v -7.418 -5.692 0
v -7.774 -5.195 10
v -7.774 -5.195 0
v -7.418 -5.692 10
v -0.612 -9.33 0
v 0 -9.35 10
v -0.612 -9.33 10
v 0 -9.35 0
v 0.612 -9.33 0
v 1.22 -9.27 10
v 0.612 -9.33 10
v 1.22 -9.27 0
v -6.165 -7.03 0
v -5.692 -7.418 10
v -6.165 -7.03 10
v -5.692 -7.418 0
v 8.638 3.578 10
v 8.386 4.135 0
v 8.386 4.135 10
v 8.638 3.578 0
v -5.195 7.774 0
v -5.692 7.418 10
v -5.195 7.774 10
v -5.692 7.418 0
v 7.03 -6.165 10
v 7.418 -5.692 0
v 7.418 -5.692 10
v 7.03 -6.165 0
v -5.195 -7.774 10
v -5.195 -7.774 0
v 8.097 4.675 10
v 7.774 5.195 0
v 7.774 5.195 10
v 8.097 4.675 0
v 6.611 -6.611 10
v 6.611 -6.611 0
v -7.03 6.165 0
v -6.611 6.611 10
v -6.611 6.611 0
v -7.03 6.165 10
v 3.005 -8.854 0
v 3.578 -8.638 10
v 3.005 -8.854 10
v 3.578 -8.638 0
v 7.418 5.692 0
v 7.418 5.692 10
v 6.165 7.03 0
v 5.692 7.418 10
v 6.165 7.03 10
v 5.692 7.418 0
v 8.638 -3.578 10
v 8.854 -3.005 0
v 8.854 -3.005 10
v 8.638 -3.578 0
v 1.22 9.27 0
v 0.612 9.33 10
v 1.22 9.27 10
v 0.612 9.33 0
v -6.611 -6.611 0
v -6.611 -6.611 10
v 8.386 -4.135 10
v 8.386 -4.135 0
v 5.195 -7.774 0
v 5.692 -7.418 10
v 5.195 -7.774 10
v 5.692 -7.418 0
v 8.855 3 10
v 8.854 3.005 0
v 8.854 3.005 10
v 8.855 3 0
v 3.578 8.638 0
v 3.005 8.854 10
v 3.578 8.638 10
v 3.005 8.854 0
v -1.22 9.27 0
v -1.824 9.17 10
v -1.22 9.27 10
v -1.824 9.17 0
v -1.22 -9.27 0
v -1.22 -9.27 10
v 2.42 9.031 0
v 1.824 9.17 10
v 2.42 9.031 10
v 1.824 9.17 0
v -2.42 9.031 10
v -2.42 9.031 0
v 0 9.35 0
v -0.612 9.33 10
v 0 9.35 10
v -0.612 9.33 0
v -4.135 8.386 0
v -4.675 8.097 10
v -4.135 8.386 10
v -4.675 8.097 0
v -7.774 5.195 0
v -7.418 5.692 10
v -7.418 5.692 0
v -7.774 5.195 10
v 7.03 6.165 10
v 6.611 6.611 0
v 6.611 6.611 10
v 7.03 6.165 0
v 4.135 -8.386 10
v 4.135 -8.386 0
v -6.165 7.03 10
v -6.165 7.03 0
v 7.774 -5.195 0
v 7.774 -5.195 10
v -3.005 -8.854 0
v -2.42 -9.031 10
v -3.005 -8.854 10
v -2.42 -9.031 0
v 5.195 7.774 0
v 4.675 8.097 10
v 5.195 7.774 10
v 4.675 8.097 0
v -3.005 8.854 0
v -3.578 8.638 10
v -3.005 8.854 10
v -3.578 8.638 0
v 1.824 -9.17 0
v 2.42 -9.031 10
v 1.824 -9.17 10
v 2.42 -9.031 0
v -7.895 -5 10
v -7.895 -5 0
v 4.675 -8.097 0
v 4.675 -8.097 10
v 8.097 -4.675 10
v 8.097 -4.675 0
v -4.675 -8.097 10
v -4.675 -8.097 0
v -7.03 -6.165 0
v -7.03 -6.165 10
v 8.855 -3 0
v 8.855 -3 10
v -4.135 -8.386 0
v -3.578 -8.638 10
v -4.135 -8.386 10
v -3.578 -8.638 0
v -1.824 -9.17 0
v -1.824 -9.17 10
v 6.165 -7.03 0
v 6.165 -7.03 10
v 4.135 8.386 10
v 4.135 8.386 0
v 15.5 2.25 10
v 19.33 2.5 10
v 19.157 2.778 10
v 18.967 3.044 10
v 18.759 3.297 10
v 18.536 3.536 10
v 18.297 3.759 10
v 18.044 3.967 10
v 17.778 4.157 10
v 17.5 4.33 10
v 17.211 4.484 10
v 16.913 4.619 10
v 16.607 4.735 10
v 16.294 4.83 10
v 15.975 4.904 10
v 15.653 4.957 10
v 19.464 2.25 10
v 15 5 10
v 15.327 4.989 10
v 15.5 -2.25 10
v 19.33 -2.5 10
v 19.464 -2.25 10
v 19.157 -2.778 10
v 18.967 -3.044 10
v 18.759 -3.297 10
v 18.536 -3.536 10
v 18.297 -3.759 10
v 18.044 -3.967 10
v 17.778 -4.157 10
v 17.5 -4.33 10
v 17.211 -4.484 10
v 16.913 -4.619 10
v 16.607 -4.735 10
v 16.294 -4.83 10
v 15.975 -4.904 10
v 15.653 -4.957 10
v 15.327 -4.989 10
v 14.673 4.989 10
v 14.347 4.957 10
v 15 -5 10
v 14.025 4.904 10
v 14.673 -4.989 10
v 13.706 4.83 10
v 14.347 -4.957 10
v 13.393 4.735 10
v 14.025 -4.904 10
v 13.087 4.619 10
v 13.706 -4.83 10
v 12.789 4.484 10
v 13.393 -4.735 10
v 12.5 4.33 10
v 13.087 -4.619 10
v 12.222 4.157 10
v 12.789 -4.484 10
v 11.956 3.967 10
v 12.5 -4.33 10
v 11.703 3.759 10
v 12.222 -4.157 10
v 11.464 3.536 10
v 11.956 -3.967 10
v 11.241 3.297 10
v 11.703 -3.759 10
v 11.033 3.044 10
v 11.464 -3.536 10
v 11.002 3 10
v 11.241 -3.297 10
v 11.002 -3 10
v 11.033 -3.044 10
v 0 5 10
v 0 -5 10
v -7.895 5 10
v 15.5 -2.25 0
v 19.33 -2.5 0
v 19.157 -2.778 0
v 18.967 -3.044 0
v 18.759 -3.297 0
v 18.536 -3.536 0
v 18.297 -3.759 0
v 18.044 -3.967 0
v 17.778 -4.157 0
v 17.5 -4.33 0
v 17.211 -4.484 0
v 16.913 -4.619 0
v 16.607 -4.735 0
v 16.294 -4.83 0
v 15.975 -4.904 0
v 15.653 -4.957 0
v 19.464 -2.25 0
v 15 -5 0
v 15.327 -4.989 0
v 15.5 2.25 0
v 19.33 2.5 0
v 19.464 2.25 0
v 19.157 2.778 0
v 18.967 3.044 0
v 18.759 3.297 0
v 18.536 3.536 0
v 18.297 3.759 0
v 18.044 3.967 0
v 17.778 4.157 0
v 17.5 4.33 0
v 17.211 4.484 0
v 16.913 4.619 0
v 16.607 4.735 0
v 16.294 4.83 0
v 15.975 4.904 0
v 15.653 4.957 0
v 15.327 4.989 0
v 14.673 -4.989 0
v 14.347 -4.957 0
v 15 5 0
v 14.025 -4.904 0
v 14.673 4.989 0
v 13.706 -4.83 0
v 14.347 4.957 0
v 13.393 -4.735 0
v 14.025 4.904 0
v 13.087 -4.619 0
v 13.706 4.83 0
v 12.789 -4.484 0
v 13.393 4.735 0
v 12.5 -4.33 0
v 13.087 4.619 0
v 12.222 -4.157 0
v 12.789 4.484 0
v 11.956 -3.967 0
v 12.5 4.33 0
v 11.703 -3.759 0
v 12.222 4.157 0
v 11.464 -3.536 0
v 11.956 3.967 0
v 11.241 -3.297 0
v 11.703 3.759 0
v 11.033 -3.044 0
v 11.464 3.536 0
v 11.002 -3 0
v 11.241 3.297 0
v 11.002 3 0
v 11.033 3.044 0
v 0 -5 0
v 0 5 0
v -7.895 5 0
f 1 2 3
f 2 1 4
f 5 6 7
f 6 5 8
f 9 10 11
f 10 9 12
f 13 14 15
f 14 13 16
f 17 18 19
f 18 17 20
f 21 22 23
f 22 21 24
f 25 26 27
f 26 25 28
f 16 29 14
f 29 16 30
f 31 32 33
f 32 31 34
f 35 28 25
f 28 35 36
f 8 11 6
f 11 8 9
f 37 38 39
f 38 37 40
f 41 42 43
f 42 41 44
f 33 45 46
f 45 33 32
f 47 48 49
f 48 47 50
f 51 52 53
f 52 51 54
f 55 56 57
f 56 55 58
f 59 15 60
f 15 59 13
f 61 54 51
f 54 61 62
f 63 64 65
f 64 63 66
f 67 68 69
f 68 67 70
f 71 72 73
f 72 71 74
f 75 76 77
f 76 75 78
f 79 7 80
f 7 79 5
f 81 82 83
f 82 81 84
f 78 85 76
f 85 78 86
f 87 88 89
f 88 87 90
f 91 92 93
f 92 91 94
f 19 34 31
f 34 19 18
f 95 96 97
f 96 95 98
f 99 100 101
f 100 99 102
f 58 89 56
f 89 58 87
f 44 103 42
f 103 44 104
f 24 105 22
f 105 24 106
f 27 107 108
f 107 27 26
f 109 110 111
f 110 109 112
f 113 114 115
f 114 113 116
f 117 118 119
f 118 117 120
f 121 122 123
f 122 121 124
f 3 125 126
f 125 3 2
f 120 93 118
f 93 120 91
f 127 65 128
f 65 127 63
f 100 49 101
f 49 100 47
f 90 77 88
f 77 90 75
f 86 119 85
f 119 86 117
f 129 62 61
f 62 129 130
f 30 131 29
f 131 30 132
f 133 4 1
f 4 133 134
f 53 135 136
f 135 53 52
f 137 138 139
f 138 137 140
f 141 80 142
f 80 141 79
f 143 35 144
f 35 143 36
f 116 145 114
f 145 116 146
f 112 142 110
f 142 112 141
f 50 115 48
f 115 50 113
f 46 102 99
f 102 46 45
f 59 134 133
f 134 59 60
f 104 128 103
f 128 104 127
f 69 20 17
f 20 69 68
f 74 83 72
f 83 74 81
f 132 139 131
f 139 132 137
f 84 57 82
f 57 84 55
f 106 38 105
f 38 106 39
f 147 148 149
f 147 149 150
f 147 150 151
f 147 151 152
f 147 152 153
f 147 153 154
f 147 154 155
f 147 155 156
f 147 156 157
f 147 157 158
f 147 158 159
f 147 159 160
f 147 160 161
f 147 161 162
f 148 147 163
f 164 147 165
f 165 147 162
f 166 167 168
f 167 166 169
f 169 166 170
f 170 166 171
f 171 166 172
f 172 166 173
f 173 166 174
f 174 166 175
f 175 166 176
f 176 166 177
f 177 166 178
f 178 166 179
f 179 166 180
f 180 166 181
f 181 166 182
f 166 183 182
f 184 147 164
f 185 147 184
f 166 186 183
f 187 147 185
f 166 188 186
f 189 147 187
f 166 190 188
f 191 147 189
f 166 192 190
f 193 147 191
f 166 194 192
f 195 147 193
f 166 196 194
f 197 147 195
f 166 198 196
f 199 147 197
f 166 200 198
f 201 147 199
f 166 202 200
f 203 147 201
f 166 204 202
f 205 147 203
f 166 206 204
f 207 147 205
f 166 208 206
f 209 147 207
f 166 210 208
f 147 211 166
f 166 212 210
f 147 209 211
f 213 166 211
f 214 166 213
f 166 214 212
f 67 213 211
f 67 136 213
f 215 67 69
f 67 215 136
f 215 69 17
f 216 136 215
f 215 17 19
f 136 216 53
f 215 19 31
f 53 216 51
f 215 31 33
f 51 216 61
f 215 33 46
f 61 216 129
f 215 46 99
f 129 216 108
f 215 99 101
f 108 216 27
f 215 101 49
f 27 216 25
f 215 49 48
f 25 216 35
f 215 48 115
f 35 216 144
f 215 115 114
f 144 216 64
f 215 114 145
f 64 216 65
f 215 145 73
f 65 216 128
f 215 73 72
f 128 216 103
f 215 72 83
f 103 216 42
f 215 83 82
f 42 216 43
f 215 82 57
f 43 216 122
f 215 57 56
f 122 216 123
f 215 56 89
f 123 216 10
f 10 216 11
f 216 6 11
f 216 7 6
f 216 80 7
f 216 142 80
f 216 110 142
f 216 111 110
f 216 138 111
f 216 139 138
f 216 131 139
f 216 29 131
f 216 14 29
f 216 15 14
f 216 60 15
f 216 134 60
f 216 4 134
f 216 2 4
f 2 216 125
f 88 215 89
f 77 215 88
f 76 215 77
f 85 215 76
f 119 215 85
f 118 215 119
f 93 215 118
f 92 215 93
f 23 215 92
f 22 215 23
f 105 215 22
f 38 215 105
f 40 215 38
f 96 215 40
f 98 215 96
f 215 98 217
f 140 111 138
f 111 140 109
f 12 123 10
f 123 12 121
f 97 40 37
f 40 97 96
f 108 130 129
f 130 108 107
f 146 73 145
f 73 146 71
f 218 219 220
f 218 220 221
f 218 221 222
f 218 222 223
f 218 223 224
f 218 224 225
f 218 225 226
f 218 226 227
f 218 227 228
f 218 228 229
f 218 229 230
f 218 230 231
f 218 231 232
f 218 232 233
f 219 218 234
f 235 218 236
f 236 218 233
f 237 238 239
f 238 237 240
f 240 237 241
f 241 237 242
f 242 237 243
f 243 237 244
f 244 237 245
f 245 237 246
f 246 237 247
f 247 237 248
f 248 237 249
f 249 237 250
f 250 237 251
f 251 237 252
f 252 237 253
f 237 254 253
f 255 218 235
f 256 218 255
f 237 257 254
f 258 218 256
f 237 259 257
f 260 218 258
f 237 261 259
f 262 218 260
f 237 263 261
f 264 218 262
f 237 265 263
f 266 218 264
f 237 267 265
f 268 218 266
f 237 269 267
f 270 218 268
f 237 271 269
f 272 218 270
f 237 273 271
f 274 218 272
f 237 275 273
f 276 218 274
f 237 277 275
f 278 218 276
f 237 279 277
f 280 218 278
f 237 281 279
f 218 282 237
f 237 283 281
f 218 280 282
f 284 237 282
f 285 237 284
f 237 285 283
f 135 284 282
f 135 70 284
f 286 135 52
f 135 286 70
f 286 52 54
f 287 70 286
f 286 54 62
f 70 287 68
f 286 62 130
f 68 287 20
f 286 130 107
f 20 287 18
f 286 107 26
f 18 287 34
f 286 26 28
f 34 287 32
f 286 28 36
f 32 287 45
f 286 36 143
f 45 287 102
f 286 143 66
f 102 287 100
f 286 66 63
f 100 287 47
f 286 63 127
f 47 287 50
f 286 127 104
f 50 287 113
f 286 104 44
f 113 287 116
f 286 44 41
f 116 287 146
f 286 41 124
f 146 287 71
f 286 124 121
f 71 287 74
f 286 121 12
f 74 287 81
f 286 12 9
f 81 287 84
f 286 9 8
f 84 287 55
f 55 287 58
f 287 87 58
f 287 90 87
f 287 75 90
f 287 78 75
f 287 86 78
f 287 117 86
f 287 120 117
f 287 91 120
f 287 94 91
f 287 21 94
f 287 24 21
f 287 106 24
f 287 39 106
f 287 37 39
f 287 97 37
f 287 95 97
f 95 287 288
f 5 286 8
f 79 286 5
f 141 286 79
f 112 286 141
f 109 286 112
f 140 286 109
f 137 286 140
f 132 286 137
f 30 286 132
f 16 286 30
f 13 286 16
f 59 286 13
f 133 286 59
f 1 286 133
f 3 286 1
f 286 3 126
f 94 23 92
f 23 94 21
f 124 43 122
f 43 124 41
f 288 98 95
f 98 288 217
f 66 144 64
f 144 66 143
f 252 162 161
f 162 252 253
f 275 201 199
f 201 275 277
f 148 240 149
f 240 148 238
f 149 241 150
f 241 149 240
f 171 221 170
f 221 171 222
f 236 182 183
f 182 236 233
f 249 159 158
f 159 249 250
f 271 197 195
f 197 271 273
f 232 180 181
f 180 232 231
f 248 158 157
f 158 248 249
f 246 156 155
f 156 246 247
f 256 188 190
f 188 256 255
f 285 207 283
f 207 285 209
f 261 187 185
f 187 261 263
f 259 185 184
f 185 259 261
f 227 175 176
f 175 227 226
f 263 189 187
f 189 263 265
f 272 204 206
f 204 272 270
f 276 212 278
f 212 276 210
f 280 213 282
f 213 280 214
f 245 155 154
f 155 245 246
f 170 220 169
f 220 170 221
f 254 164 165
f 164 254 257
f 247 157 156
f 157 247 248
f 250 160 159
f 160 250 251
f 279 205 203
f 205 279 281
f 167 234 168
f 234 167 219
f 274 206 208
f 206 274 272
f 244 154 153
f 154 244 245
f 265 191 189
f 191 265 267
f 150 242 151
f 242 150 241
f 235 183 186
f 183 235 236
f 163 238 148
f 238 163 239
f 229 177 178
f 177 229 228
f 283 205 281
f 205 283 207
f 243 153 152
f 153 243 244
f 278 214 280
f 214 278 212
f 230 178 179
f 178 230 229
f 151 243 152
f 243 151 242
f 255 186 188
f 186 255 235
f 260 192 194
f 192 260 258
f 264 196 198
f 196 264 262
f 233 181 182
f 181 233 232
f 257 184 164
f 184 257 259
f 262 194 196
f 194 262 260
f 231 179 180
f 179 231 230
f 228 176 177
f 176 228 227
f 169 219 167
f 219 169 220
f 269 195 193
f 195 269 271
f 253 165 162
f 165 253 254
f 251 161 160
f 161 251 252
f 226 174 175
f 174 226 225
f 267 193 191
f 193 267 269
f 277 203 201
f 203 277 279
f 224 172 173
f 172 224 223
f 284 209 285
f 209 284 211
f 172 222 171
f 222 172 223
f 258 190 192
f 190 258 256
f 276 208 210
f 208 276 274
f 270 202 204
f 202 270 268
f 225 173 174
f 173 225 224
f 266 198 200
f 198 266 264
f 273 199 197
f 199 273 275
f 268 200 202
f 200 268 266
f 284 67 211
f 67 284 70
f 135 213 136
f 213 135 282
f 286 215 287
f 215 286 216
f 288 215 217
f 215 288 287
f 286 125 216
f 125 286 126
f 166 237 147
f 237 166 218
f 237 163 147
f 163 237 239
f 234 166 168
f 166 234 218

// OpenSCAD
// Tubing clip for 12.7 mm lab stand rod
// Print orientation: flat on bed, extrusion builds up in +Z

$fn = 96;

// ---- Dimensions (mm) ----
rod_d      = 12.7;   // rod diameter
ring_w     = 3;      // rod ring wall thickness
rod_r      = rod_d/2 + ring_w;  // rod ring outer radius (18.7/2)
opening_w  = 10;     // rod ring opening width along -X
tubing_d   = 6;      // tubing inner diameter
tubing_w   = 2;      // tubing wall thickness
tubing_r   = tubing_d/2 + tubing_w;  // tubing outer radius
tubing_x   = 15;     // tubing ring centre X
opening2_w = 4.5;    // tubing opening width along +X
bridge_w   = 6;      // bridge width (Y)
bridge_x0  = 8;      // bridge start X
bridge_x1  = 12;     // bridge end X
eps        = 0.5;    // cut overshoot

difference() {
    union() {
        // Rod ring
        cylinder(r = rod_r, h = 10);
        // Tubing ring
        translate([tubing_x, 0, 0])
            cylinder(r = tubing_r, h = 10);
        // Bridge
        translate([bridge_x0, -bridge_w/2, 0])
            cube([bridge_x1 - bridge_x0, bridge_w, 10]);
    }
    // Rod opening (-X side)
    translate([-rod_r - eps, -opening_w/2, 0])
        cube([rod_r + eps, opening_w, 10]);
    // Tubing opening (+X side)
    translate([tubing_x + eps, -opening2_w/2, 0])
        cube([rod_r + 2*eps, opening2_w, 10]);
}
